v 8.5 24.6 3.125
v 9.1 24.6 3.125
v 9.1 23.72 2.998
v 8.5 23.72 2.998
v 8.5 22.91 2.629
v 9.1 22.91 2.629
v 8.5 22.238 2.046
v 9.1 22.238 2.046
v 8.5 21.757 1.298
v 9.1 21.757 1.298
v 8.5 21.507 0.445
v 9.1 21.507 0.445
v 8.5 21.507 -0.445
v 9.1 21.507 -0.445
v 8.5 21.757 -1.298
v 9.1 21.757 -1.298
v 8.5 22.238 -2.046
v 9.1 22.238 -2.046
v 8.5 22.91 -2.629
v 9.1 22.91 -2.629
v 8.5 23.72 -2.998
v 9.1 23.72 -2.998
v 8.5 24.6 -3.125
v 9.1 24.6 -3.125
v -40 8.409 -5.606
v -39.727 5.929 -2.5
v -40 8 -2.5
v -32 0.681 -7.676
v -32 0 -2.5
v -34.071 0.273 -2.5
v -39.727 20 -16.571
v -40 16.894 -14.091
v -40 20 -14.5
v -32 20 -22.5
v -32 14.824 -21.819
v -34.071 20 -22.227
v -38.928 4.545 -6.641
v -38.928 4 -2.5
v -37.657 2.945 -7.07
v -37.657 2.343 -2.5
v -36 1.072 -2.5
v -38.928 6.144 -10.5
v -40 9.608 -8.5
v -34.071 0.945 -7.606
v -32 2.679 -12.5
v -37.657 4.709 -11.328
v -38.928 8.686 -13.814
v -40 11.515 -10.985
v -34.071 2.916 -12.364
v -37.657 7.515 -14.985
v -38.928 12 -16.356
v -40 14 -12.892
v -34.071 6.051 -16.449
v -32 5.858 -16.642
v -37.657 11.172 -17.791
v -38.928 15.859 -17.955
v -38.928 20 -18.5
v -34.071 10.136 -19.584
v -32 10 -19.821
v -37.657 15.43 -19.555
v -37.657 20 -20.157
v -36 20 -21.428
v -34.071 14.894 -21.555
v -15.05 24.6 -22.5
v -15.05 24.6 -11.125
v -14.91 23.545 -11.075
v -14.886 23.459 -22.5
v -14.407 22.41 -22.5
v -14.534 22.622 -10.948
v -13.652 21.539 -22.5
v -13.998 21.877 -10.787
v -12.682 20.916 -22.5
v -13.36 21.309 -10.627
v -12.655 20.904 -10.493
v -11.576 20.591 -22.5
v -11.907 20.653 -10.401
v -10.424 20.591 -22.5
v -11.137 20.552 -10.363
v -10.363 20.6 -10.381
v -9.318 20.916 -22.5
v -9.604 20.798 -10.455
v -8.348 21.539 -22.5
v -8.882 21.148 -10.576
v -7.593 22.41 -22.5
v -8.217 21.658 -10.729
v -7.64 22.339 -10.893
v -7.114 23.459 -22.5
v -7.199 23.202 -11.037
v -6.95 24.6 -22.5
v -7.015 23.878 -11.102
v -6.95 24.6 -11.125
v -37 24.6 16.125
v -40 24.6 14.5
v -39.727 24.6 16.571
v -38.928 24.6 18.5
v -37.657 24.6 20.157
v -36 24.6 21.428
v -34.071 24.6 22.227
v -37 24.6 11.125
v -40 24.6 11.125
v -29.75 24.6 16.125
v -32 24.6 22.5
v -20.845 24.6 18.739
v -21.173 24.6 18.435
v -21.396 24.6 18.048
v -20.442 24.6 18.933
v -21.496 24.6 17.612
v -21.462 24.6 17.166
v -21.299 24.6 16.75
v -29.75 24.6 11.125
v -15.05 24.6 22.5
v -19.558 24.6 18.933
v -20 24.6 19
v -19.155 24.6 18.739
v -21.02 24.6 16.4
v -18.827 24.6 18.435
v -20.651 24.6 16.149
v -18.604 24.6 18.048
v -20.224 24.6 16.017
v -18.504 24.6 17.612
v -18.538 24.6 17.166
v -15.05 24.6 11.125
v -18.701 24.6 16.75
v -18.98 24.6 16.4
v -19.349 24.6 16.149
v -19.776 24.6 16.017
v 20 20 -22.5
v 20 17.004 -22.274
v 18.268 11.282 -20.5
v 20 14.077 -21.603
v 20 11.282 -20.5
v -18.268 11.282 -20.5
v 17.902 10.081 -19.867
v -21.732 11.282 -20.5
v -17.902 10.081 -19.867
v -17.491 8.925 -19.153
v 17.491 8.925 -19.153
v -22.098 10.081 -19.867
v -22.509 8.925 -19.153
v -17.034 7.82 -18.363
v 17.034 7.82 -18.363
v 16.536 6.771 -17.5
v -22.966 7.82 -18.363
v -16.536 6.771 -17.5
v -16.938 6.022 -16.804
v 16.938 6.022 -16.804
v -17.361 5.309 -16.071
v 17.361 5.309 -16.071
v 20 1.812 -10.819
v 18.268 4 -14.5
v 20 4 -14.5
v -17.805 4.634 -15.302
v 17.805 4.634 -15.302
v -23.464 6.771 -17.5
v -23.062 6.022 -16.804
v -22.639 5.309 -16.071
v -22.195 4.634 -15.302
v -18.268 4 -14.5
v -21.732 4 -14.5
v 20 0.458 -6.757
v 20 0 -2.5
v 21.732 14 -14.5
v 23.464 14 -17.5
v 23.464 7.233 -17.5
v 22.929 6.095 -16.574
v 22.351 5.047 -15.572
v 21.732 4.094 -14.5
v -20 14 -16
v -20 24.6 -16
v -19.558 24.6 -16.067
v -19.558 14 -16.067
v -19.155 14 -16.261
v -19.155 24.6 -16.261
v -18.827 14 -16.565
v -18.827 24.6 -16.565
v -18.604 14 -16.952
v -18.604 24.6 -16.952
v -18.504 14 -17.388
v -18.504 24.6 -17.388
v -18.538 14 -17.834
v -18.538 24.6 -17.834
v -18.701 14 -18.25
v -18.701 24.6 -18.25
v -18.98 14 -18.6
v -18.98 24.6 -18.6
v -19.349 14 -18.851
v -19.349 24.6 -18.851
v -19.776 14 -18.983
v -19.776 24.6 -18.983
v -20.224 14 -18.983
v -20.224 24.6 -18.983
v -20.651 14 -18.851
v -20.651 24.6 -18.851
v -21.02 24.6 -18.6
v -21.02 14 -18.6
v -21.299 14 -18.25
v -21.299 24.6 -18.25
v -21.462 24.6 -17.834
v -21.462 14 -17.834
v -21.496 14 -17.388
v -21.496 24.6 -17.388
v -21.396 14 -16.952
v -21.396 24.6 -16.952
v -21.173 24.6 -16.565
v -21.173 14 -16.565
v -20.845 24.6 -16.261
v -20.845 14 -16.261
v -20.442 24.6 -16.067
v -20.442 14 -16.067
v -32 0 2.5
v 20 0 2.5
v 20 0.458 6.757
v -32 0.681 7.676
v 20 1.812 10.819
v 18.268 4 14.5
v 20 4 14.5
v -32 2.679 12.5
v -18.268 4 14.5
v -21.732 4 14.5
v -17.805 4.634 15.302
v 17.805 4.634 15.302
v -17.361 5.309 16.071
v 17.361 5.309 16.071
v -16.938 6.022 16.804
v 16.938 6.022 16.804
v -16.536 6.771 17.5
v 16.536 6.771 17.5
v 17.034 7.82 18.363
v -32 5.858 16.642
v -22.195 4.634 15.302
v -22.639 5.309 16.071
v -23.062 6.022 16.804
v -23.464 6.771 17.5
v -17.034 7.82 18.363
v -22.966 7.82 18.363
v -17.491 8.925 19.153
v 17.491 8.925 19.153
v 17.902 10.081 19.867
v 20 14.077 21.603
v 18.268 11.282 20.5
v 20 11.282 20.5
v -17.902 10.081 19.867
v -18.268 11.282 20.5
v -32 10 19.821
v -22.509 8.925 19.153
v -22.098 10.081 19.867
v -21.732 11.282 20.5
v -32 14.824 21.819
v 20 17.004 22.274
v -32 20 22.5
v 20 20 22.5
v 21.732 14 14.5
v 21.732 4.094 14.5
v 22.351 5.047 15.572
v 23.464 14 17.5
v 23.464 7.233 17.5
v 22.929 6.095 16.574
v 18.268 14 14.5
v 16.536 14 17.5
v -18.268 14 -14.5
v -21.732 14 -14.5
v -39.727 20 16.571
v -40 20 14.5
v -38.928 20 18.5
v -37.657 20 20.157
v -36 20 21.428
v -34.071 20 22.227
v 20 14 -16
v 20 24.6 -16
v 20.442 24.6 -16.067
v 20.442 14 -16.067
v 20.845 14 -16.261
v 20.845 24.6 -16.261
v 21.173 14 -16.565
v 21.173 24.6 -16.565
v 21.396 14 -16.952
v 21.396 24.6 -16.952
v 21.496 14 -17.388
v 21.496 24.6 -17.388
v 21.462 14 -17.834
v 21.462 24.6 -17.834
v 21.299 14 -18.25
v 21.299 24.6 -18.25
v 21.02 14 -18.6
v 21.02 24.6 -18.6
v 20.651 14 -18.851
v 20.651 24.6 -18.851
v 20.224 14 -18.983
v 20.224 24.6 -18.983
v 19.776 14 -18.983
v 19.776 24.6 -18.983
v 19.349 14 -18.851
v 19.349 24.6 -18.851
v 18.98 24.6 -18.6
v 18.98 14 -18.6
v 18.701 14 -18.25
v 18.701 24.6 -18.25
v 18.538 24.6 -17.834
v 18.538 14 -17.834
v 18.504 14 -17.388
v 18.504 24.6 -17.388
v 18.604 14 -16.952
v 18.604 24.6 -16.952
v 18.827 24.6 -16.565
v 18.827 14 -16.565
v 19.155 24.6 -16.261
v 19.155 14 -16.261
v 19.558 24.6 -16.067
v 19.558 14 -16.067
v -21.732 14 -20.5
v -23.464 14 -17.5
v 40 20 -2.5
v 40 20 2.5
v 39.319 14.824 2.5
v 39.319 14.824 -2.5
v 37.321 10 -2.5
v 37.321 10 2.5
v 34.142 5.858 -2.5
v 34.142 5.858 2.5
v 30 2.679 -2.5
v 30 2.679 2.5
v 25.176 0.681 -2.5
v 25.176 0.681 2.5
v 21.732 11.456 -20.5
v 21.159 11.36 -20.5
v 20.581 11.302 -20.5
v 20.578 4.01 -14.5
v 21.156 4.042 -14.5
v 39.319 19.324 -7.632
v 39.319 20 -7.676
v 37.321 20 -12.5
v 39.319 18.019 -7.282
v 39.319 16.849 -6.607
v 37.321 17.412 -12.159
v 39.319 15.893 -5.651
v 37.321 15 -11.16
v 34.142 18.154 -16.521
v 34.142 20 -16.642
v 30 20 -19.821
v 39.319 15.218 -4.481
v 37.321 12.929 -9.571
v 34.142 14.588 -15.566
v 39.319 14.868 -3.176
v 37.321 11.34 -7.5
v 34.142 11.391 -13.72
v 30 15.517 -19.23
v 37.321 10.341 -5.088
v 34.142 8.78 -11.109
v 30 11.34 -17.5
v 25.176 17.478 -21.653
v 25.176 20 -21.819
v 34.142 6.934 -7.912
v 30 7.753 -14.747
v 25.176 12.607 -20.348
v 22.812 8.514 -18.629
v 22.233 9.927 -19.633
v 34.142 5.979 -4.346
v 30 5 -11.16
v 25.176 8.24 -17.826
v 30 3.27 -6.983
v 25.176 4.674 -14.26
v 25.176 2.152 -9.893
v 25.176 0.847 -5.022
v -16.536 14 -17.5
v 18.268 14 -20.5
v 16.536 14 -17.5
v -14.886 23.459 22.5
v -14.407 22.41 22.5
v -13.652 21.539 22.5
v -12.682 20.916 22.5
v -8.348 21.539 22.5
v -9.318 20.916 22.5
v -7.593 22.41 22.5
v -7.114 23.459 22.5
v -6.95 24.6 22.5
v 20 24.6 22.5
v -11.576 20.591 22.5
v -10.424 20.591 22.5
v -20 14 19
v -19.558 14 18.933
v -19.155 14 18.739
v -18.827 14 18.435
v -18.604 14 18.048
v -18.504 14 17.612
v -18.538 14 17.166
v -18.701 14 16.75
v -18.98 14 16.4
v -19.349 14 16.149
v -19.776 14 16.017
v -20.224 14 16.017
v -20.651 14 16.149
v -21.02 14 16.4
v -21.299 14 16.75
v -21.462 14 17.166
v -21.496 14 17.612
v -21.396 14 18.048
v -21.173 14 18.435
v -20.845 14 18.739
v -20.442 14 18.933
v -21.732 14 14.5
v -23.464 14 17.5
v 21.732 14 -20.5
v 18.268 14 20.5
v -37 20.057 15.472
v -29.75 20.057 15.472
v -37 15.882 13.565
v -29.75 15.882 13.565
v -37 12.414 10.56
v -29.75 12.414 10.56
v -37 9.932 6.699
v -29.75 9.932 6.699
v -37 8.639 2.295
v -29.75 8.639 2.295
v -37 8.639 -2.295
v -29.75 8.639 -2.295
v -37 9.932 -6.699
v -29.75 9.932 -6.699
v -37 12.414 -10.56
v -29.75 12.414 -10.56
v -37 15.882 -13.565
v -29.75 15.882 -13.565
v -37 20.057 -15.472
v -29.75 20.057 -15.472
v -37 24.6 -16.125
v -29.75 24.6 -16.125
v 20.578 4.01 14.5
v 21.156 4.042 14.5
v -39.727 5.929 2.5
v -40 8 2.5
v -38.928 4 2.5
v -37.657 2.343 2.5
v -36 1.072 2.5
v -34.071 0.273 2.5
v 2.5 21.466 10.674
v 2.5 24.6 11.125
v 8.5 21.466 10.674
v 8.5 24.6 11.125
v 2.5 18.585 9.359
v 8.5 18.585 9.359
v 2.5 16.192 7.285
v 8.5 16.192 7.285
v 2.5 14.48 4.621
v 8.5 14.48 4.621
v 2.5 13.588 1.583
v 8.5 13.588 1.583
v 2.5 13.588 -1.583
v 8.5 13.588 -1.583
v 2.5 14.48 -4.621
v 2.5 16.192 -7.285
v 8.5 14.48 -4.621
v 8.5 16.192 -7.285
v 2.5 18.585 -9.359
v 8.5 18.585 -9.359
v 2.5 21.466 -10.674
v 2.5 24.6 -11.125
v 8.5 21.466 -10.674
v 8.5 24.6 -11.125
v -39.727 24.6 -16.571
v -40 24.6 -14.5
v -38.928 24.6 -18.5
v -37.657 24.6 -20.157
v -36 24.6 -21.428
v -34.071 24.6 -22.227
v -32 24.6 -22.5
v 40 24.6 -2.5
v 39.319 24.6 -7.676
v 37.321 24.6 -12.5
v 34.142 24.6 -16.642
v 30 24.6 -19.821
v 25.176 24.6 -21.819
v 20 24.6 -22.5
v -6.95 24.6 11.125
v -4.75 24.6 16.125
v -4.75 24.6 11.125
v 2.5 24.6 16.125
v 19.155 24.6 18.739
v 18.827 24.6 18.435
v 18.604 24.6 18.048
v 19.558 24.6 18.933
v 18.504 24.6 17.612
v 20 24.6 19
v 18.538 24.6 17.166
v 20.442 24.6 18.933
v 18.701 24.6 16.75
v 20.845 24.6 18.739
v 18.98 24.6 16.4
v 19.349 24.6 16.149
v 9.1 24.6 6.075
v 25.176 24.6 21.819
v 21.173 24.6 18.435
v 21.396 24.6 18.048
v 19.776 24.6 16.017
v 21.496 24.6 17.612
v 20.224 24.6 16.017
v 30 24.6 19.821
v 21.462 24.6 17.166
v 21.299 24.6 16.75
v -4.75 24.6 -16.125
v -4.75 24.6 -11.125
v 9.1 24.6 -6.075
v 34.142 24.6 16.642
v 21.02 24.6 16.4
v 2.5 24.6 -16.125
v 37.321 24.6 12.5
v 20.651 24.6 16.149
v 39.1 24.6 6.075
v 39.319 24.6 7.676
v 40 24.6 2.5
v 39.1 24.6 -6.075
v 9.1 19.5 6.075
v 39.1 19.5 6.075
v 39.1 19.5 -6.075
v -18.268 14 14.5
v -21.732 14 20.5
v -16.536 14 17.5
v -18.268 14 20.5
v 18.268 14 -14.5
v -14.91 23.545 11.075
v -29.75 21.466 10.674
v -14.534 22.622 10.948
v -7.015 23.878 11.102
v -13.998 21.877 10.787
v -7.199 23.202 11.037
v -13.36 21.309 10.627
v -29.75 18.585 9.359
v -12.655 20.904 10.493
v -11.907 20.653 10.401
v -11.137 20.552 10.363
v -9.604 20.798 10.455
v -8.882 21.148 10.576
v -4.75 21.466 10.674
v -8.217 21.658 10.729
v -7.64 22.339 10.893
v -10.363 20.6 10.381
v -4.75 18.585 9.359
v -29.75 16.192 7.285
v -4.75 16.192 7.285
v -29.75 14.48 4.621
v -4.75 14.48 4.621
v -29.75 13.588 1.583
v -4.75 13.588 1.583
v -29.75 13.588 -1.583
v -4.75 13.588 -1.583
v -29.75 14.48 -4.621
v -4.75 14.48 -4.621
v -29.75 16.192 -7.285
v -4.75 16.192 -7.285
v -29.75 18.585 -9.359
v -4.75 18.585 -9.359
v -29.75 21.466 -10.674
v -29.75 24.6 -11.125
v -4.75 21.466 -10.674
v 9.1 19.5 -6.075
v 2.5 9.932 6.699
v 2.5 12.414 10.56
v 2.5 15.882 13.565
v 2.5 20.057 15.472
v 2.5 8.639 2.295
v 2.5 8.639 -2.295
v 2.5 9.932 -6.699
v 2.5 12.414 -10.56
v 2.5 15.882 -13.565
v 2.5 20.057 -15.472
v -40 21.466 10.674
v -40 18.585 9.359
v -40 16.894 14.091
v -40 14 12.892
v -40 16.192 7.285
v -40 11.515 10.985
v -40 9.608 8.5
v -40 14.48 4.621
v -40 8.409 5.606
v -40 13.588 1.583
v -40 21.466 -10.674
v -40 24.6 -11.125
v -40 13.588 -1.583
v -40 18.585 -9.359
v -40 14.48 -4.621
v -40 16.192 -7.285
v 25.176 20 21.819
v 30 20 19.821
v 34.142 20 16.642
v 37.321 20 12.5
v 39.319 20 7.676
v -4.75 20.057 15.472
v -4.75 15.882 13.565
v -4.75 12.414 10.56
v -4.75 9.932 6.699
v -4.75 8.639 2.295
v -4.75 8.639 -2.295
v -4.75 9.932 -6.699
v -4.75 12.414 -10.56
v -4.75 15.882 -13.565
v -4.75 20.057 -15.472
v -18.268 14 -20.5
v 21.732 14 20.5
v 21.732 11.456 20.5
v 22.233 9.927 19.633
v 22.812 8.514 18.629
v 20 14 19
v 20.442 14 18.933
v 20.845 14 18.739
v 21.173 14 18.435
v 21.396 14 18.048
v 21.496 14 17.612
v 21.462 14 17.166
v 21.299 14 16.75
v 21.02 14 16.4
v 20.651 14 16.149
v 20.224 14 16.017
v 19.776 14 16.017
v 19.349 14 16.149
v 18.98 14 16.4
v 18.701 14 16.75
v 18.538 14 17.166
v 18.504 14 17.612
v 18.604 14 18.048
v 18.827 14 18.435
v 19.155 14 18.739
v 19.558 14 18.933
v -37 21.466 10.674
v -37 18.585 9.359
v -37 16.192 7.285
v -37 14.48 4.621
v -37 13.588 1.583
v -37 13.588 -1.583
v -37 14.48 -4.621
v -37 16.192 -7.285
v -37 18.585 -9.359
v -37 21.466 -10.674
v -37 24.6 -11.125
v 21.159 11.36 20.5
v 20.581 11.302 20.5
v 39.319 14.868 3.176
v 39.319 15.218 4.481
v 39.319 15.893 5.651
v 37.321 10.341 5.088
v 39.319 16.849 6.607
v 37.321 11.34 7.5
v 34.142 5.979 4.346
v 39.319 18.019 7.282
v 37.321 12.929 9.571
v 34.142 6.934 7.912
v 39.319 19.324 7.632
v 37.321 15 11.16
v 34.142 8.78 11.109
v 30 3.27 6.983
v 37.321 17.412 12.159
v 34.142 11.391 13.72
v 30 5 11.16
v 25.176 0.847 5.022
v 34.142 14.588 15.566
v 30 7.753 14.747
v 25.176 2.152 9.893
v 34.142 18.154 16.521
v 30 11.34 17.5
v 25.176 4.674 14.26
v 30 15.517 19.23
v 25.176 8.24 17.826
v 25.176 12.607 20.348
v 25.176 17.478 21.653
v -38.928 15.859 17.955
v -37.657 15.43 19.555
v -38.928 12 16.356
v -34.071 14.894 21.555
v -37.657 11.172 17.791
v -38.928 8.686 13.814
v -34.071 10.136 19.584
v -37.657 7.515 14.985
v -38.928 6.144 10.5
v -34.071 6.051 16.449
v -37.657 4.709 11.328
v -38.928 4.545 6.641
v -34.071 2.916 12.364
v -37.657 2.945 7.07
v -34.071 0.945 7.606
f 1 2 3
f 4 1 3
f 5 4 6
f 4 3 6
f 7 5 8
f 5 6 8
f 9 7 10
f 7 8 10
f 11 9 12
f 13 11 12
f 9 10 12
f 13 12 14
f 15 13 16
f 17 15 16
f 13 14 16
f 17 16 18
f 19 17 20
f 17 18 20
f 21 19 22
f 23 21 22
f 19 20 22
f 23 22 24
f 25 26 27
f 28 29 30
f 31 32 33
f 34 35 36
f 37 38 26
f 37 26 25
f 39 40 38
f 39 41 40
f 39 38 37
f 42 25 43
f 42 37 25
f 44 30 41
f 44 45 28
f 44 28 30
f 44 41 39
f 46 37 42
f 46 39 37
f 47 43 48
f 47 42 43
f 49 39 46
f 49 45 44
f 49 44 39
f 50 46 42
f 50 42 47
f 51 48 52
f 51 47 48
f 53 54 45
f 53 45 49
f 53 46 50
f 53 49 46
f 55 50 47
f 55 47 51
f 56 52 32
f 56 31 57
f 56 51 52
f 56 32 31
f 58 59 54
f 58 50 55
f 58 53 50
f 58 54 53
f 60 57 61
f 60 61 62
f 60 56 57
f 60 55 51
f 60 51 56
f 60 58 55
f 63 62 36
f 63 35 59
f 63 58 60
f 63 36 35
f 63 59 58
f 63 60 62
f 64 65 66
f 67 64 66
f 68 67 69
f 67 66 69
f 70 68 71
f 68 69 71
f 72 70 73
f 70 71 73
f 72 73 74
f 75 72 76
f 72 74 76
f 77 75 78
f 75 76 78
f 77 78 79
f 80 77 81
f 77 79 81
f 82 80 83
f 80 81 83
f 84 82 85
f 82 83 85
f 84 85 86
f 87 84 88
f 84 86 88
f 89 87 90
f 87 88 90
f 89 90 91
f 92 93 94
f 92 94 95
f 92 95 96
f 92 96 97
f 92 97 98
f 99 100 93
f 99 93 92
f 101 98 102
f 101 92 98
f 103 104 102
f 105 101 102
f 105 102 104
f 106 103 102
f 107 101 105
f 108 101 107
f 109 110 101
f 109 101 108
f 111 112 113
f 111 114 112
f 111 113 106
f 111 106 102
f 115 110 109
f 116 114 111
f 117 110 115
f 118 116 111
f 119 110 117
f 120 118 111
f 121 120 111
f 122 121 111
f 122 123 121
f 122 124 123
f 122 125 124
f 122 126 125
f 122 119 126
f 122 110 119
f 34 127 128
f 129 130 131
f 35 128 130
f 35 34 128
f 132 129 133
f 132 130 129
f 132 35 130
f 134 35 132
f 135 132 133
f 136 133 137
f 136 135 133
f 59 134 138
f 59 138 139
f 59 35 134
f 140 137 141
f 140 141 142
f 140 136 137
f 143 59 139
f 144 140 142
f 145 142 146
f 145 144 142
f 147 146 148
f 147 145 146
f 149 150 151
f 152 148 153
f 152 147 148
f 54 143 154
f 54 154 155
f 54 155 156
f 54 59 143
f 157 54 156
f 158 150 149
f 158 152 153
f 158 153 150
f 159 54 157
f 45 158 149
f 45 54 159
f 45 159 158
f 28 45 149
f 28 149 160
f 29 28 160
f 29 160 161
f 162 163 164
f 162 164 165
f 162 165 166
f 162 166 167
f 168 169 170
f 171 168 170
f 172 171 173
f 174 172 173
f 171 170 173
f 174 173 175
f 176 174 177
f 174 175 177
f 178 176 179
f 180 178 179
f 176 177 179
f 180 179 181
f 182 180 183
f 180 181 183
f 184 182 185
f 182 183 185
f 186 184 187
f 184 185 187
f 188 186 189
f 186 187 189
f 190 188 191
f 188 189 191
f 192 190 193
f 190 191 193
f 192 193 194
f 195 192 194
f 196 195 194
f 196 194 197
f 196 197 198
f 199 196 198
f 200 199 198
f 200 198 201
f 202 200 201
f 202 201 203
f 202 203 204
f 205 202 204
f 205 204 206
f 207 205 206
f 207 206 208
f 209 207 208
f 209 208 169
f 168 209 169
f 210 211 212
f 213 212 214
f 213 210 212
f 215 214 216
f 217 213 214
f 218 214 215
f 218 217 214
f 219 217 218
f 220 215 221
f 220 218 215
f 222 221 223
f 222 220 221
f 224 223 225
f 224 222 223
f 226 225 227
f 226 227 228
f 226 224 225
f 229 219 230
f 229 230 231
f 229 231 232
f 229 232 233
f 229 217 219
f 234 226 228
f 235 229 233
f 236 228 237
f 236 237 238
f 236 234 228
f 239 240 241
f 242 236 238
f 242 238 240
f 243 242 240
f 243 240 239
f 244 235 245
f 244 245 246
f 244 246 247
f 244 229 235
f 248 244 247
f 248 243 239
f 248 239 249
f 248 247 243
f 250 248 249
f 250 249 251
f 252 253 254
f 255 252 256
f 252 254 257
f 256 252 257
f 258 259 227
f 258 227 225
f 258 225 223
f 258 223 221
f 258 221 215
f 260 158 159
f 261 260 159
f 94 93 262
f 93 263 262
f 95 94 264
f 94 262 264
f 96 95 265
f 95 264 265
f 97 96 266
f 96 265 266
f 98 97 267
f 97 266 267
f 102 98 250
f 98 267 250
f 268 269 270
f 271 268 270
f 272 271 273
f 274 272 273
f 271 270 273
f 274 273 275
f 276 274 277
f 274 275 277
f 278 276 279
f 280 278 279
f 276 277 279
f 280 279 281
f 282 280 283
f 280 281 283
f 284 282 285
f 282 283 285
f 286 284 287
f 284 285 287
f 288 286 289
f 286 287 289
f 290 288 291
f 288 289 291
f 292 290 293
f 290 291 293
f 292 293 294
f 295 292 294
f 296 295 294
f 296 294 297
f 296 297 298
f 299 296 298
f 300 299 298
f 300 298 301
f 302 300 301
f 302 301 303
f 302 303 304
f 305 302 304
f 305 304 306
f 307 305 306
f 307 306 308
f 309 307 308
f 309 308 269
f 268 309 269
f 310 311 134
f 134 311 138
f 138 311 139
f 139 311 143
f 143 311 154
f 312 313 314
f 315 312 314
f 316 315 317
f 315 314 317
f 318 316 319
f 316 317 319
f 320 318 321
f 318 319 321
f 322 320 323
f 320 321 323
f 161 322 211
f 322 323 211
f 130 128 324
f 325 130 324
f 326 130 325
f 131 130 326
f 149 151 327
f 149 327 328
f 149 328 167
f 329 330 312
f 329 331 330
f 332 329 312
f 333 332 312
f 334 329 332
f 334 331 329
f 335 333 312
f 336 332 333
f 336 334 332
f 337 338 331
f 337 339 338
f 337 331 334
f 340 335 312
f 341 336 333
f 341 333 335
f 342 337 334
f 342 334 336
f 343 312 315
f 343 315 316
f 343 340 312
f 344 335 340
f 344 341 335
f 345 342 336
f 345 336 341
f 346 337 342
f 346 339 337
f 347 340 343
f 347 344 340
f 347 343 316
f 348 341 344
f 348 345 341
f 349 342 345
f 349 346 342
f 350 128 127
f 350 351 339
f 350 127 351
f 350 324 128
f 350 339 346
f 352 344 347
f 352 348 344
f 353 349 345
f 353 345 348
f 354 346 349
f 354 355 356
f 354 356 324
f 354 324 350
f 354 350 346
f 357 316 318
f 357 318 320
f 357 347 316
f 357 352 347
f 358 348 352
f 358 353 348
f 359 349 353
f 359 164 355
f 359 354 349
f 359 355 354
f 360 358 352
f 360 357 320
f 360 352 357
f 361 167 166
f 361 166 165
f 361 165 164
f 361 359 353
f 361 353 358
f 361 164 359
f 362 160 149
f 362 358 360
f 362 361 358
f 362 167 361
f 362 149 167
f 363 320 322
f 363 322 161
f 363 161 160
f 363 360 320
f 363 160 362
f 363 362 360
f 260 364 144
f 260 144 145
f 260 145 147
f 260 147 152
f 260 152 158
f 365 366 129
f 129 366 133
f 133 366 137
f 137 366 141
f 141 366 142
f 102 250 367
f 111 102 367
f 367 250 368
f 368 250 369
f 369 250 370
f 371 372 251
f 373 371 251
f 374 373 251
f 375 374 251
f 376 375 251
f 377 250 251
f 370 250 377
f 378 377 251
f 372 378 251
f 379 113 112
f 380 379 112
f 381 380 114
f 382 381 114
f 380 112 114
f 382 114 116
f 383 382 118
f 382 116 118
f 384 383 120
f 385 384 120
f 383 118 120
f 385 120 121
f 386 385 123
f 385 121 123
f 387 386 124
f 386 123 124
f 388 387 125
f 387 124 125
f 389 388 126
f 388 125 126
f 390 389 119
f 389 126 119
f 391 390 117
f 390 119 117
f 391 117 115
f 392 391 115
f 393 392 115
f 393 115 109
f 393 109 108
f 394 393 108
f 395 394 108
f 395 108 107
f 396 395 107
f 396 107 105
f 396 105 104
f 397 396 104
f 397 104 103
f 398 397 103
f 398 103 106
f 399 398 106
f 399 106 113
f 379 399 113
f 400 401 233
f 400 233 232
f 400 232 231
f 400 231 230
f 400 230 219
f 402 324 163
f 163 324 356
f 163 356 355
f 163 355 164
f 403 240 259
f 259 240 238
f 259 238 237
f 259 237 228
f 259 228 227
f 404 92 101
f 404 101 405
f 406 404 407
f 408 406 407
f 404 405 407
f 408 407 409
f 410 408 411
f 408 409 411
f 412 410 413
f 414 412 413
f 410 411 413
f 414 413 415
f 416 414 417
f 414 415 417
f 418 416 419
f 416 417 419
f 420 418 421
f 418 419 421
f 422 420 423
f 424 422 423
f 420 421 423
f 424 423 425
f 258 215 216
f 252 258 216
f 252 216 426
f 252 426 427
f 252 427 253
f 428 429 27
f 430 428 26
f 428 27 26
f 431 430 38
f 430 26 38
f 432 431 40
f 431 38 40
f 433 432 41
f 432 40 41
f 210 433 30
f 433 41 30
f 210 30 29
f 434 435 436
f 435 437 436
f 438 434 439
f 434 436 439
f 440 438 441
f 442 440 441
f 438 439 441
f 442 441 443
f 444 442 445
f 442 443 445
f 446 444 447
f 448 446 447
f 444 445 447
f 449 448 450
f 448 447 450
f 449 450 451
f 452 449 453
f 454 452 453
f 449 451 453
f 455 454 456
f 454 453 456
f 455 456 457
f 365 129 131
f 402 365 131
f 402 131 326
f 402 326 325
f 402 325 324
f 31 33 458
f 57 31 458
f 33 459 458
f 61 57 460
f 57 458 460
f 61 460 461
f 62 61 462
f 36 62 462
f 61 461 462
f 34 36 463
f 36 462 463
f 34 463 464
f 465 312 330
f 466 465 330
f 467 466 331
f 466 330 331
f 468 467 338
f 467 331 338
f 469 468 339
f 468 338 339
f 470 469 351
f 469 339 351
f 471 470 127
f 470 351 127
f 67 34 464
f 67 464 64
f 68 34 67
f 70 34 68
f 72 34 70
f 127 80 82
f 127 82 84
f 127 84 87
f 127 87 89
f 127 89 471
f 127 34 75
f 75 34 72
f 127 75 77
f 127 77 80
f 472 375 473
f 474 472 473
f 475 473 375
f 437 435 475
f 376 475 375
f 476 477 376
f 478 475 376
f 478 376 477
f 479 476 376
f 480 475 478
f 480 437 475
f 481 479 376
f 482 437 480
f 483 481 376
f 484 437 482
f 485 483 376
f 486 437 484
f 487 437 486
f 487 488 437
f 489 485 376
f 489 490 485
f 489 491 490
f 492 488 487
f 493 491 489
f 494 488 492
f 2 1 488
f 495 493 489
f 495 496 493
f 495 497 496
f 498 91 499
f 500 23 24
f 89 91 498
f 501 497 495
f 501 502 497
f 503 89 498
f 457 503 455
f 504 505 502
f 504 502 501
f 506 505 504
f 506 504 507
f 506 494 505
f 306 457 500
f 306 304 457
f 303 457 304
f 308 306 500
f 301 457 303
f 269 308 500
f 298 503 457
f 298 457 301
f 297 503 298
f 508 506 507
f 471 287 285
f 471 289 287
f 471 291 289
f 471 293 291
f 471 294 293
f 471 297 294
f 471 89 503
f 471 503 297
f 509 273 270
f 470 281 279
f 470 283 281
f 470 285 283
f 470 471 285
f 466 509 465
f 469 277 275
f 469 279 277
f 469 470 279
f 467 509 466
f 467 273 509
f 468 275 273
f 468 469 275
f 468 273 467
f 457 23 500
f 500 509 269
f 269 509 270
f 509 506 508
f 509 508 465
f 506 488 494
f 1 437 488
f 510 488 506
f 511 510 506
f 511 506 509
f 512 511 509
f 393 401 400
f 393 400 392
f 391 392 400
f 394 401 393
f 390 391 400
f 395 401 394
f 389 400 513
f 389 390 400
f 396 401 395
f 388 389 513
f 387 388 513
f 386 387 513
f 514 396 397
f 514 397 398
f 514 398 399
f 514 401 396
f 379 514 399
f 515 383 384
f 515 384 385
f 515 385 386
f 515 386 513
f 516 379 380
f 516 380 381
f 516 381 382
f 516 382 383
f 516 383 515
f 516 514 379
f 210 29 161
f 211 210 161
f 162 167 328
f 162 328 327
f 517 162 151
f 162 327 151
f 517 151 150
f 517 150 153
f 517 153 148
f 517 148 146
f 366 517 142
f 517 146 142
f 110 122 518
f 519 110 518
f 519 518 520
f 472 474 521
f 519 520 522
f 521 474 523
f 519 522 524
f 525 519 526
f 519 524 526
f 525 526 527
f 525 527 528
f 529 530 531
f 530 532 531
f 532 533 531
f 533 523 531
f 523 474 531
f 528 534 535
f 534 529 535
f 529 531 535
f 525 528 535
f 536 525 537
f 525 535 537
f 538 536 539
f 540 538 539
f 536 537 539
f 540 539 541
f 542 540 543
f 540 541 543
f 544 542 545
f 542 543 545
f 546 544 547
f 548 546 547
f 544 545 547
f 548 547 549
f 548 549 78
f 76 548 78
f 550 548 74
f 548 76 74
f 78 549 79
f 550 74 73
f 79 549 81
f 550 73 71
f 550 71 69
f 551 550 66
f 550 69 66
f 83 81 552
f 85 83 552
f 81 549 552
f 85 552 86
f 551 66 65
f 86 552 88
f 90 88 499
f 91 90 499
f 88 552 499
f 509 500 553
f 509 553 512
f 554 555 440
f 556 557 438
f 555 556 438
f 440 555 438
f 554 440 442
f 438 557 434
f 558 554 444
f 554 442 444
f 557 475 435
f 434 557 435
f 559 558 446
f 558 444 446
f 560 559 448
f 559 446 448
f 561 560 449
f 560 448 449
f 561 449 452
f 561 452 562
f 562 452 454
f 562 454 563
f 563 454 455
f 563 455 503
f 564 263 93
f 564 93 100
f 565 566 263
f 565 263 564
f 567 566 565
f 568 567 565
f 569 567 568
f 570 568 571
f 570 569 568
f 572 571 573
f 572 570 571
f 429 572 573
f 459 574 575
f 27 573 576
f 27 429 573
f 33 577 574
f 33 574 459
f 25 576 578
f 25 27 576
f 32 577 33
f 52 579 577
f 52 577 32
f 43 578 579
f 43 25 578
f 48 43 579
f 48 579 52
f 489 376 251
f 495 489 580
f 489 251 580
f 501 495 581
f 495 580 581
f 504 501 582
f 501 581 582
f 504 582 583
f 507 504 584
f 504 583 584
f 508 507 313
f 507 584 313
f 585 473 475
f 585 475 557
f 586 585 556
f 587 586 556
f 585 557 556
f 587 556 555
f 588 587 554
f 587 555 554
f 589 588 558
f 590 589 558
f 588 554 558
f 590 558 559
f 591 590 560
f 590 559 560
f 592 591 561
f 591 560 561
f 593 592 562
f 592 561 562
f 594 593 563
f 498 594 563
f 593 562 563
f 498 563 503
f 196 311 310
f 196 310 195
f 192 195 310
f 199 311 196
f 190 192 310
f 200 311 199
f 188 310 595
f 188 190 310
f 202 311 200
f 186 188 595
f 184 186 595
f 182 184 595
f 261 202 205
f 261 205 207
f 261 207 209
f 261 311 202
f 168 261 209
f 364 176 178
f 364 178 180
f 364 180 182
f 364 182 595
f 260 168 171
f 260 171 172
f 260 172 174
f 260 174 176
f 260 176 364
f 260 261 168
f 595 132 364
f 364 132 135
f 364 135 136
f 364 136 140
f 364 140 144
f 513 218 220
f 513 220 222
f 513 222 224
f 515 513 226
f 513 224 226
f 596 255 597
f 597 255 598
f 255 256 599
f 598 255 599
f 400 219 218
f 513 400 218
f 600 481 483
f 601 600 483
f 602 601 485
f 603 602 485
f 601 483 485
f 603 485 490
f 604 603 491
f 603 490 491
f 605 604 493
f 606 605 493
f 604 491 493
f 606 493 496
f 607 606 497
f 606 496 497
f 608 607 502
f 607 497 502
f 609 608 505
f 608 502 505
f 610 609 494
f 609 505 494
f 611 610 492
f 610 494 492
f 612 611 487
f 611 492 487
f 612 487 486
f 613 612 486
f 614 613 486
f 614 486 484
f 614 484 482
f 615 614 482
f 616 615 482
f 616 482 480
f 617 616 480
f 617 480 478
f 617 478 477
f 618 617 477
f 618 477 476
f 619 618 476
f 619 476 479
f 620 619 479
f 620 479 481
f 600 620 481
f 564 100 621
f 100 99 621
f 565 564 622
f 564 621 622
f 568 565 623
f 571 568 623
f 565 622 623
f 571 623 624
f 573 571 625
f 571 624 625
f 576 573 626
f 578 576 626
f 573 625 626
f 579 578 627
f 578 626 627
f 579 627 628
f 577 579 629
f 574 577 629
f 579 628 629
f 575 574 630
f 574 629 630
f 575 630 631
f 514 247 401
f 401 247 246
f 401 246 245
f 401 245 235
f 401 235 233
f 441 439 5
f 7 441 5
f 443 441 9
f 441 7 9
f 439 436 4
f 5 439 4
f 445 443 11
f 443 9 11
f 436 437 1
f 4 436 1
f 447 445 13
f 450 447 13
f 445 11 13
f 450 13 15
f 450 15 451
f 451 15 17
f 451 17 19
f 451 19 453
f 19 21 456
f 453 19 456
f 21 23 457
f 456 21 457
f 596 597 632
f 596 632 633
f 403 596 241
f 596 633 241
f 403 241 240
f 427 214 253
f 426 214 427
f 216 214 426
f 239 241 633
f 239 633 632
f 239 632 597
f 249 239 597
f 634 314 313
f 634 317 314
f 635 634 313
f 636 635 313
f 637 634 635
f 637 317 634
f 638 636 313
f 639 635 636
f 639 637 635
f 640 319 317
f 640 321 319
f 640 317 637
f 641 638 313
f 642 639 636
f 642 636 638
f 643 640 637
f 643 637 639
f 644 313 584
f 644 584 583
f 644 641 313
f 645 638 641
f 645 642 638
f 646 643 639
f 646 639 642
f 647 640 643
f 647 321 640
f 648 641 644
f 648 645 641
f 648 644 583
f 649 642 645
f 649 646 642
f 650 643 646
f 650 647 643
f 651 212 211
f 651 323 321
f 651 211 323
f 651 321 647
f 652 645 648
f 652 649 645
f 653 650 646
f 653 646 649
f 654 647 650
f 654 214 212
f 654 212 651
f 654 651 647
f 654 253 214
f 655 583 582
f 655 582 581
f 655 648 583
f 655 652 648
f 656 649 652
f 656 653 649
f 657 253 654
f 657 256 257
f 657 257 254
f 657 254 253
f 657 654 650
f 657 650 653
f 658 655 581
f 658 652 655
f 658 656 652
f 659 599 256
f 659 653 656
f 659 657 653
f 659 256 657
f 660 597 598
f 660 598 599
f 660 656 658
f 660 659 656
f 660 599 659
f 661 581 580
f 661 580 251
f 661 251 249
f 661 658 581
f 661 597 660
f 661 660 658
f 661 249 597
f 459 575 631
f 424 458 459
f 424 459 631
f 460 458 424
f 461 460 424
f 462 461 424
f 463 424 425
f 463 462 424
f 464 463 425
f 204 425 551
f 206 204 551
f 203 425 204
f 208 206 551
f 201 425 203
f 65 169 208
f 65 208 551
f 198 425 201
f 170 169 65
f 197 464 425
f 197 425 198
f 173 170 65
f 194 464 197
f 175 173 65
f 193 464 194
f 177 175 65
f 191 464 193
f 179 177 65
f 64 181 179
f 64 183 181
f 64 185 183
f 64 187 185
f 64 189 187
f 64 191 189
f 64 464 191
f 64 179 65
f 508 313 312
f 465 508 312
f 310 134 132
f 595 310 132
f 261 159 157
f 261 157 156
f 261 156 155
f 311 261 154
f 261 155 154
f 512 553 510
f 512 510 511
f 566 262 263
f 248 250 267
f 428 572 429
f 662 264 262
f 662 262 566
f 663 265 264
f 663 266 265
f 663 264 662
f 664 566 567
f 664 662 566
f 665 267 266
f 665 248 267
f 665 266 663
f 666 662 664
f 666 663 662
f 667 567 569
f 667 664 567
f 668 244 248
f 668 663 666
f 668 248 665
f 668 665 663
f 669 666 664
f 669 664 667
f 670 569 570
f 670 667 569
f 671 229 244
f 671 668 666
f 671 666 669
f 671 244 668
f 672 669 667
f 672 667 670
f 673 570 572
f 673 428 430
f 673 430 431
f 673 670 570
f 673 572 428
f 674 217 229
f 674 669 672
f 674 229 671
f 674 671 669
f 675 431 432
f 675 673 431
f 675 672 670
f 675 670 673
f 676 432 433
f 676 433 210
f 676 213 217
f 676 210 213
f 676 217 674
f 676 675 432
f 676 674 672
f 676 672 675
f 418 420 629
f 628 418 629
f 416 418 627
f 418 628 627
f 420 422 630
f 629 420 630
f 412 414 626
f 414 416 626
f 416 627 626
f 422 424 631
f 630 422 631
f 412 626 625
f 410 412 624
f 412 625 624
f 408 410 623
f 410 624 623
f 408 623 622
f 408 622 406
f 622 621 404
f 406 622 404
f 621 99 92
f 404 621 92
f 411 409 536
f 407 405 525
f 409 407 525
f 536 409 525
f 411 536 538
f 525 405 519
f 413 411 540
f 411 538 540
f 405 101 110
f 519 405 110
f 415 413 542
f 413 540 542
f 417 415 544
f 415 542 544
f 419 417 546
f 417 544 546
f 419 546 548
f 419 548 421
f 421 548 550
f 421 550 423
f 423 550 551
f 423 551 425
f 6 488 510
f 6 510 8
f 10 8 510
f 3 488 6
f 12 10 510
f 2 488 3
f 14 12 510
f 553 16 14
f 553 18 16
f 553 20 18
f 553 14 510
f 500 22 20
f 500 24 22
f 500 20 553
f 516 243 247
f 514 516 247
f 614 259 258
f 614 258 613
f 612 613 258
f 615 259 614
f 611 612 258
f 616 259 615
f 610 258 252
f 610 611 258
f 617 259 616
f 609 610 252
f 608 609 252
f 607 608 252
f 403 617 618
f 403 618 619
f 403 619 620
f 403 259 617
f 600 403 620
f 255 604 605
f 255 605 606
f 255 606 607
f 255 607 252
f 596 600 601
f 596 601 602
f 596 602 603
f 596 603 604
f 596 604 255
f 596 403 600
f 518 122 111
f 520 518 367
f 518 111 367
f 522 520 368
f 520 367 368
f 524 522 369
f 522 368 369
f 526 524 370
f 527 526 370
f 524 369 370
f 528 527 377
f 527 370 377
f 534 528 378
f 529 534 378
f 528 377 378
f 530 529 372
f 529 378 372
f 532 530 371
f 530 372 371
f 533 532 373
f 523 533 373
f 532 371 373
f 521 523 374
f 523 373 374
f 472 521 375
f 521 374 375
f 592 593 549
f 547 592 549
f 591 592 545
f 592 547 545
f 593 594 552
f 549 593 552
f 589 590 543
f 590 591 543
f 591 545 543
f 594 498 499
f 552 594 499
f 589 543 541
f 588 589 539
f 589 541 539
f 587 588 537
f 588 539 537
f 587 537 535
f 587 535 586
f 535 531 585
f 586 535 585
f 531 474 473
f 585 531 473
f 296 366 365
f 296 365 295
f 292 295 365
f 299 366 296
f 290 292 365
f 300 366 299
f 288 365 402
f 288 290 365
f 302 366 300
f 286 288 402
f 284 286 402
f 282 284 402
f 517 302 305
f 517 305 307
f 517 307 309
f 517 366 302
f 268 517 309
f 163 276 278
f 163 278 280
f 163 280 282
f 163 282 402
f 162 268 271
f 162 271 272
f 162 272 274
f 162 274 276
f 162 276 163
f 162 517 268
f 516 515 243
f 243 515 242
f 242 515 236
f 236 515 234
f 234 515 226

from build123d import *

# Parameters (mm, degrees)
SKETCH1_W           = 80
SKETCH1_H           = 45
BOSS_EXTRUDE1_DEPTH = 24.6
SKETCH3_W           = 30
SKETCH3_H           = 12.15
CUT_EXTRUDE1_DEPTH  = 5.1
SKETCH4_R           = 4.05
CUT_EXTRUDE2_DEPTH  = 66.039680196
SKETCH5_R           = 1.5
CUT_EXTRUDE3_DEPTH  = 31
FILLET1_START       = -40
FILLET1_DEPTH       = 80
FILLET2_R           = 20
CUT_EXTRUDE4_DEPTH  = 14
FILLET3_R           = 8


with BuildPart() as part:
    # Sketch1 → Boss-Extrude1 (new body)
    with BuildSketch(Plane(origin=(0, 0, 0), x_dir=(1, 0, 0), z_dir=(0, 1, 0))):
        Rectangle(SKETCH1_W, SKETCH1_H)
    extrude(amount=BOSS_EXTRUDE1_DEPTH)

    # Sketch2 → Cut-Revolve1 (revolve, cut)
    with BuildSketch(Plane(origin=(0, 24.6, 0), x_dir=(1, 0, 0), z_dir=(0, 1, 0))):
        Polygon((8.5, 3.125), (9.5, 3.125), (9.5, 0), (6, 0), (-40, 0), (-40, 11.125), (-37, 11.125), (-37, 16.125), (-29.75, 16.125), (-29.75, 11.125), (-4.75, 11.125), (-4.75, 16.125), (2.5, 16.125), (2.5, 11.125), (8.5, 11.125), align=None)
    revolve(axis=Axis((-40, 24.6, 0), (1, 0, 0)), mode=Mode.SUBTRACT)

    # Sketch3 → Cut-Extrude1 (cut)
    with BuildSketch(Plane(origin=(0, 24.6, 0), x_dir=(1, 0, 0), z_dir=(0, 1, 0))):
        with Locations((24.1, 0)):
            Rectangle(SKETCH3_W, SKETCH3_H)
    extrude(amount=-CUT_EXTRUDE1_DEPTH, mode=Mode.SUBTRACT)

    # Sketch4 → Cut-Extrude2 (cut, through all)
    with BuildSketch(Plane.XY.offset(22.5)):
        with Locations((-11, 24.6)):
            Circle(SKETCH4_R)
    extrude(amount=-CUT_EXTRUDE2_DEPTH, mode=Mode.SUBTRACT)

    # Sketch5 → Cut-Extrude3 (cut)
    with BuildSketch(Plane(origin=(0, 24.6, 0), x_dir=(1, 0, 0), z_dir=(0, 1, 0))):
        with Locations(Location((-20, 17.5, 0), (0, 0, 270))):
            Circle(SKETCH5_R)
        with Locations(Location((-20, -17.5, 0), (0, 0, 270))):
            Circle(SKETCH5_R)
        with Locations(Location((20, -17.5, 0), (0, 0, 270))):
            Circle(SKETCH5_R)
        with Locations(Location((20, 17.5, 0), (0, 0, 270))):
            Circle(SKETCH5_R)
    extrude(amount=-CUT_EXTRUDE3_DEPTH, mode=Mode.SUBTRACT)

    # Fillet1: read off the stored shape, not the designer's step
    # Fillet1 outline → Fillet1 (cut)
    with BuildSketch(Plane.YZ.offset(FILLET1_START)):
        with BuildLine():
            Line((0, 22.5), (0, 2.5))
            ThreePointArc((0, 2.5), (5.857864376, 16.642135624), (20, 22.5))
            Line((20, 22.5), (0, 22.5))
        make_face()
        with BuildLine():
            ThreePointArc((20, -22.5), (5.857864376, -16.642135624), (0, -2.5))
            Line((0, -2.5), (0, -22.5))
            Line((0, -22.5), (20, -22.5))
        make_face()
    extrude(amount=FILLET1_DEPTH, mode=Mode.SUBTRACT)

    # Fillet2
    # the kernel refuses this fillet: 20 mm, written as the material it takes off along each edge
    with BuildSketch(Plane(origin=(40, 0, 2.5), x_dir=(0, 1, 0), z_dir=(0, 0, -1))) as fillet2_piece_1:
        with BuildLine():
            CenterArc((FILLET2_R, -FILLET2_R), FILLET2_R, 90, 90)
            Line((0, -FILLET2_R), (0, 0))
            Line((0, 0), (FILLET2_R, 0))
        make_face()
    extrude(amount=5, mode=Mode.SUBTRACT)
    with BuildSketch(Plane(origin=(40, 19.999999999, 2.500000001), x_dir=(0, -1.0, -4.592977109962882e-11), z_dir=(0, 4.592977109962882e-11, -1.0))) as fillet2_piece_2:
        with BuildLine():
            CenterArc((19.999999999 - FILLET2_R, FILLET2_R), FILLET2_R, 270, 90)
            Line((19.999999999 - FILLET2_R, 0), (19.999999999, 0))
            Line((19.999999999, 0), (19.999999999, FILLET2_R))
        make_face()
    revolve(axis=Axis((40, 19.999999999, 2.500000001), (-1, 0, 0)), revolution_arc=90.000000005, mode=Mode.SUBTRACT)
    with BuildSketch(Plane(origin=(40, 19.999999999, -2.500000001), x_dir=(0, 4.592966007732635e-11, -1.0), z_dir=(0, 1.0, 4.592966007732635e-11))) as fillet2_piece_3:
        with BuildLine():
            CenterArc((19.999999999 - FILLET2_R, FILLET2_R), FILLET2_R, 270, 90)
            Line((19.999999999, FILLET2_R), (19.999999999, 0))
            Line((19.999999999, 0), (19.999999999 - FILLET2_R, 0))
        make_face()
    revolve(axis=Axis((40, 19.999999999, -2.500000001), (-1, 0, 0)), revolution_arc=90.000000005, mode=Mode.SUBTRACT)
    with BuildSketch(Plane(origin=(40, 20, 22.5), x_dir=(-1, 0, 0), z_dir=(0, 1, 0)), Plane(origin=(40, 20, -22.5), x_dir=(0, 0, 1), z_dir=(0, 1, 0))) as fillet2_piece_4:
        with BuildLine():
            CenterArc((FILLET2_R, -FILLET2_R), FILLET2_R, 90, 90)
            Line((0, -FILLET2_R), (0, 0))
            Line((0, 0), (FILLET2_R, 0))
        make_face()
    extrude(amount=54.6, mode=Mode.SUBTRACT)

    # Sketch6 → Cut-Extrude4 (cut)
    with BuildSketch(Plane.XZ):
        Polygon((21.732050808, 20.5), (18.267949192, 20.5), (16.535898385, 17.5), (18.267949192, 14.5), (21.732050808, 14.5), (23.464101615, 17.5), align=None)
        Polygon((-18.267949192, 20.5), (-21.732050808, 20.5), (-23.464101615, 17.5), (-21.732050808, 14.5), (-18.267949192, 14.5), (-16.535898385, 17.5), align=None)
        Polygon((-18.267949192, -14.5), (-21.732050808, -14.5), (-23.464101615, -17.5), (-21.732050808, -20.5), (-18.267949192, -20.5), (-16.535898385, -17.5), align=None)
        Polygon((21.732050808, -14.5), (18.267949192, -14.5), (16.535898385, -17.5), (18.267949192, -20.5), (21.732050808, -20.5), (23.464101615, -17.5), align=None)
    extrude(amount=-CUT_EXTRUDE4_DEPTH, mode=Mode.SUBTRACT)

    # Fillet3
    fillet3_edges = [part.edges().sort_by_distance(p)[0] for p in [
        (-40, 0, 0),
        (-40, 5.857864376, 16.642135624),
        (-40, 5.857864376, -16.642135624),
        (-40, 22.3, 22.5),
        (-40, 22.3, -22.5),
    ]]
    fillet(fillet3_edges, radius=FILLET3_R)


solid = part.part
